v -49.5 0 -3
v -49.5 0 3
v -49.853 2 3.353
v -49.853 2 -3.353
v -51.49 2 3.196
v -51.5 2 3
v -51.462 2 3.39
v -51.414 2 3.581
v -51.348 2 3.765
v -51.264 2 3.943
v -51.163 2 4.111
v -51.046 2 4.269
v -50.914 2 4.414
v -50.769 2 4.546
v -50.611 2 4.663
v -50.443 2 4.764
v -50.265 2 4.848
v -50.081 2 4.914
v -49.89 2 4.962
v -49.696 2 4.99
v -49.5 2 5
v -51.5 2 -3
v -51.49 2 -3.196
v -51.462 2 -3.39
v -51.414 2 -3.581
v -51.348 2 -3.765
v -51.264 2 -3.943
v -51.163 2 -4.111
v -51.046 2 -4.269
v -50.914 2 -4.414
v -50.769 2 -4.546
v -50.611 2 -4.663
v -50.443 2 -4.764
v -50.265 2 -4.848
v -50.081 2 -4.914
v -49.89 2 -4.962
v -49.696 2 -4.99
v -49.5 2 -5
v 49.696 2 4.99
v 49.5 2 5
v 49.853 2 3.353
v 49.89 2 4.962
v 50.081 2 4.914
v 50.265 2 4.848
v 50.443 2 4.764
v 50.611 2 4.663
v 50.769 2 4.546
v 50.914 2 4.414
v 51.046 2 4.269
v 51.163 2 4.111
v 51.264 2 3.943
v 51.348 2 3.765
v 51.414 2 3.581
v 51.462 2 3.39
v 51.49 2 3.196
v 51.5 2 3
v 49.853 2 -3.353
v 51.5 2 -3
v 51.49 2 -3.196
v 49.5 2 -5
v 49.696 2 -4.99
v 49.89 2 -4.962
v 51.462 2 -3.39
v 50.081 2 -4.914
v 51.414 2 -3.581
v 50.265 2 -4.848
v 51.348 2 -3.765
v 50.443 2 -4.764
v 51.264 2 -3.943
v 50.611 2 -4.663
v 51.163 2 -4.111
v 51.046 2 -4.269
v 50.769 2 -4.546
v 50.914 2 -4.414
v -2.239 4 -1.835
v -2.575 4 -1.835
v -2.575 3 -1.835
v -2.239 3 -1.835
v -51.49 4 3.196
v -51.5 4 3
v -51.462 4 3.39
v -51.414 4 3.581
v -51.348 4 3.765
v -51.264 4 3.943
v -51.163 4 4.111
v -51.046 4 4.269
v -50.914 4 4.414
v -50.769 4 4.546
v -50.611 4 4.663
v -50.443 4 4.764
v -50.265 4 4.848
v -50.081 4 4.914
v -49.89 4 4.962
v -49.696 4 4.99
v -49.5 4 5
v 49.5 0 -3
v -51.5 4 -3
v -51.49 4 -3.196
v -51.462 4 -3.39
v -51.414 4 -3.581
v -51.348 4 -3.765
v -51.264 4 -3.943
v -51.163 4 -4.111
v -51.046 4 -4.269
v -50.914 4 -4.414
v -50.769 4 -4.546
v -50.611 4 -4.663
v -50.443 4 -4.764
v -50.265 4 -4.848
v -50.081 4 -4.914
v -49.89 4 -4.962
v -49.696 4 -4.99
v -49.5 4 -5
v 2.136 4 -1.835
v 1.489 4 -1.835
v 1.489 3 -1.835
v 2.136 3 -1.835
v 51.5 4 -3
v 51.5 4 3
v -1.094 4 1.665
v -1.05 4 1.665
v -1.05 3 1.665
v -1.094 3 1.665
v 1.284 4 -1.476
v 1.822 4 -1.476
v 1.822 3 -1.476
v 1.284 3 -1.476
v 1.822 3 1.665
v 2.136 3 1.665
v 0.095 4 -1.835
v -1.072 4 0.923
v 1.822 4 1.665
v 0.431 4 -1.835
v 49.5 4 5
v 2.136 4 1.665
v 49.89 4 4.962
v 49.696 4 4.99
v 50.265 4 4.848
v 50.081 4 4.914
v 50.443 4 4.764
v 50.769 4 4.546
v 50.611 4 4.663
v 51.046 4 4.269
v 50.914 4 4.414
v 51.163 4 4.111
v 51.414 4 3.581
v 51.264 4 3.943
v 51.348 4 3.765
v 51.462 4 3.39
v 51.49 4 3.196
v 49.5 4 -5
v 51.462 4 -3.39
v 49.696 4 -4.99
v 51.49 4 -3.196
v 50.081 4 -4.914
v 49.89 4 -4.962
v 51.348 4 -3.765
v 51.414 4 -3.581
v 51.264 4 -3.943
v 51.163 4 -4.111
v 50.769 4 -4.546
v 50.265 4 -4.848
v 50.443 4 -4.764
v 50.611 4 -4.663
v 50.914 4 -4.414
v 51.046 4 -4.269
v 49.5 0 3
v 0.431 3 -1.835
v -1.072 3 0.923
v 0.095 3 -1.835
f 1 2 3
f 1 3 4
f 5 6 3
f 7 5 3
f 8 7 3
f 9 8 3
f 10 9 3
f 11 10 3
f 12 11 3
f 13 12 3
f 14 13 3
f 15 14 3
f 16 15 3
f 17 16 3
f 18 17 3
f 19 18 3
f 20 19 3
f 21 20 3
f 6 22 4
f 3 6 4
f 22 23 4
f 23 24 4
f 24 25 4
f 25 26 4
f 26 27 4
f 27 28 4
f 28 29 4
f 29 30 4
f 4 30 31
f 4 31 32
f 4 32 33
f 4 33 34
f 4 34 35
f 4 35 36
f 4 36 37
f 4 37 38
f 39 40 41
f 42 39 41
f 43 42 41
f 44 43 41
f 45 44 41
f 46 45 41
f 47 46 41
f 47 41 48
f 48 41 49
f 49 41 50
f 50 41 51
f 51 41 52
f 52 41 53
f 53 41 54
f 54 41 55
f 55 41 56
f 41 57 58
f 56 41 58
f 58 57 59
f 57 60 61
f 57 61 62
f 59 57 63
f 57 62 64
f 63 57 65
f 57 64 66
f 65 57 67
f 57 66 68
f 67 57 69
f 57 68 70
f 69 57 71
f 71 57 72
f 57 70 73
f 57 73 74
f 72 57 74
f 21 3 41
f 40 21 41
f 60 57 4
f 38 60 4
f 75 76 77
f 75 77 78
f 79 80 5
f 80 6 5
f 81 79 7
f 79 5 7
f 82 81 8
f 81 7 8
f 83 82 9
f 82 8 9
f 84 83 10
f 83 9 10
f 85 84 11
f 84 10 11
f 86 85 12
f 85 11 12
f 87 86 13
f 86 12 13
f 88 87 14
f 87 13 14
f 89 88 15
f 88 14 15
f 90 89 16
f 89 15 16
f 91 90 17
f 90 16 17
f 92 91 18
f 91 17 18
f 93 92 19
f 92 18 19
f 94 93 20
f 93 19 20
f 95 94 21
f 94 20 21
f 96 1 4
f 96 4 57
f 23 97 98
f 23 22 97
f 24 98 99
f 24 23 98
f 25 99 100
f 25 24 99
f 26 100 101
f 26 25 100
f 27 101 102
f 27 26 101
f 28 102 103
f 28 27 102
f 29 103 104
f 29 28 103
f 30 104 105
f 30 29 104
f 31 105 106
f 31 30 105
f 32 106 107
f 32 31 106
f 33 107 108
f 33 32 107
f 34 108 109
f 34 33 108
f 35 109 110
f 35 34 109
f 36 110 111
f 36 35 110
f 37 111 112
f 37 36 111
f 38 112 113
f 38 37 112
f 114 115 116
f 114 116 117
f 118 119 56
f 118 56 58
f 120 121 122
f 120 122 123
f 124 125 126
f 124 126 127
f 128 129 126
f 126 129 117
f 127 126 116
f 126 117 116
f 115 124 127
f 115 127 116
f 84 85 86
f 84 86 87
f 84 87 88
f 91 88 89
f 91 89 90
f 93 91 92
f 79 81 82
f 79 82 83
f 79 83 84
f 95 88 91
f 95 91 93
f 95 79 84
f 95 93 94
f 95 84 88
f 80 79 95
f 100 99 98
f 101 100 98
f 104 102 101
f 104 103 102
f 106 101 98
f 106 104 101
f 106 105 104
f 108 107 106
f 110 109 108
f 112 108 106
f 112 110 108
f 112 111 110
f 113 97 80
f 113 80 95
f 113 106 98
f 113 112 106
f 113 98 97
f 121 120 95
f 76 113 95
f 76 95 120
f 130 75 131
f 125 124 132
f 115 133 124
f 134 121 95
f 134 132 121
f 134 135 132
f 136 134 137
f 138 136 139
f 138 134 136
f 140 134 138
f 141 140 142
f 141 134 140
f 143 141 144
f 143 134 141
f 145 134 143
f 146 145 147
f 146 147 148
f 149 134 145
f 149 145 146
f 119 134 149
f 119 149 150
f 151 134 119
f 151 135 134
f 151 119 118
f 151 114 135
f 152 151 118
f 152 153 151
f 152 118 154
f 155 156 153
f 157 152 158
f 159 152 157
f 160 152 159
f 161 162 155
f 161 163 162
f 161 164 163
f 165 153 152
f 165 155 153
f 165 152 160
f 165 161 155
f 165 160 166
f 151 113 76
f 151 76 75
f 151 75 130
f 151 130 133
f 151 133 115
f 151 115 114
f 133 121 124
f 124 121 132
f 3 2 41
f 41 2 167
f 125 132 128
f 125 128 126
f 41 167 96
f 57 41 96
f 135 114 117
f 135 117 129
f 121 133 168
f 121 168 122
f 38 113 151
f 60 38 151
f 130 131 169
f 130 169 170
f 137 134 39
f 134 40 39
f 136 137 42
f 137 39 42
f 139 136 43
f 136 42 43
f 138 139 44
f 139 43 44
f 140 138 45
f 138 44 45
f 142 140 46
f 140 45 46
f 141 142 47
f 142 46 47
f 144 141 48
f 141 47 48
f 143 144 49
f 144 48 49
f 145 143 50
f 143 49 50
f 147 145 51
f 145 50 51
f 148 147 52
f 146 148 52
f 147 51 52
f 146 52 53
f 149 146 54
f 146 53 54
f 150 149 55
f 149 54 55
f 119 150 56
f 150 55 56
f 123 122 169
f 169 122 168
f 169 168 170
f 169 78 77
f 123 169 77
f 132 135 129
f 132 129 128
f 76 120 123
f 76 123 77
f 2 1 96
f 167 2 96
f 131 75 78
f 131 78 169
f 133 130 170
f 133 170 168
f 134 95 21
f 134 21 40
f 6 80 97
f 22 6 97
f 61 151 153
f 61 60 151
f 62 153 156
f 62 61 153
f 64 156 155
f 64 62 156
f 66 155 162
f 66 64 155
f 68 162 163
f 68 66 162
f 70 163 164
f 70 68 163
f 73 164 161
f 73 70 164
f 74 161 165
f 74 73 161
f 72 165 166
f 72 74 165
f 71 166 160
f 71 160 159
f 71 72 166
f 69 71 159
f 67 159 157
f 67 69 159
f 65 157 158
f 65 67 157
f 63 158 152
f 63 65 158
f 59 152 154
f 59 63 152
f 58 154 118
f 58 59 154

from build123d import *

# Parameters (mm, degrees)
SKETCH1_W           = 99
SKETCH1_H           = 6
BOSS_EXTRUDE1_DEPTH = 2
SKETCH2_W           = 101
SKETCH2_H           = 8
BOSS_EXTRUDE3_DEPTH = 2
DRAFT1_ANGLE        = 10
SKETCH3_W           = 103
SKETCH3_H           = 10
BOSS_EXTRUDE4_DEPTH = 2
FILLET1_R           = 2
CUT_EXTRUDE1_DEPTH  = 1


with BuildPart() as part:
    # Sketch1 → Boss-Extrude1 (new body)
    with BuildSketch(Plane(origin=(0, 0, 0), x_dir=(1, 0, 0), z_dir=(0, 1, 0))):
        Rectangle(SKETCH1_W, SKETCH1_H)
    extrude(amount=BOSS_EXTRUDE1_DEPTH)

    # Draft1
    draft1_faces = [part.faces().sort_by_distance(p)[0] for p in [
        (49.5, 1, 0),
        (0, 1, 3),
        (-49.5, 1, 0),
        (0, 1, -3),
    ]]
    draft(draft1_faces, Plane(origin=(0, 0, 0), x_dir=(0, 0, -1), z_dir=(0, -1, 0)), DRAFT1_ANGLE)



with BuildPart() as body_2:
    # Sketch2 → Boss-Extrude3 (new body)
    with BuildSketch(Plane(origin=(0, 2, 0), x_dir=(1, 0, 0), z_dir=(0, 1, 0))):
        Rectangle(SKETCH2_W, SKETCH2_H)
    extrude(amount=BOSS_EXTRUDE3_DEPTH)


with BuildPart() as part_1:
    add(part.part)

    add(body_2.part)  # Boss-Extrude4 merges body 2
    # Sketch3 → Boss-Extrude4 (add)
    with BuildSketch(Plane(origin=(0, 4, 0), x_dir=(1, 0, 0), z_dir=(0, 1, 0))):
        Rectangle(SKETCH3_W, SKETCH3_H)
    extrude(amount=-BOSS_EXTRUDE4_DEPTH)

    # Fillet1
    fillet1_edges = [part_1.edges().sort_by_distance(p)[0] for p in [
        (-51.5, 3, 5),
        (-51.5, 3, -5),
        (51.5, 3, -5),
        (51.5, 3, 5),
    ]]
    fillet(fillet1_edges, radius=FILLET1_R)

    # Sketch4 → Cut-Extrude1 (cut)
    with BuildSketch(Plane(origin=(0, 4, 0), x_dir=(1, 0, 0), z_dir=(0, 1, 0))):
        Polygon((-2.575148278, 1.834748189), (-2.238609816, 1.834748189), (-1.07194315, -0.923464952), (0.094723517, 1.834748189), (0.431261979, 1.834748189), (-1.049507252, -1.665251811), (-1.094379047, -1.665251811), align=None)
        Polygon((1.489254767, 1.834748189), (2.136390184, 1.834748189), (2.136390184, -1.665251811), (1.82228762, -1.665251811), (1.82228762, 1.47577383), (1.283826081, 1.47577383), align=None)
    extrude(amount=-CUT_EXTRUDE1_DEPTH, mode=Mode.SUBTRACT)


solid = part_1.part
